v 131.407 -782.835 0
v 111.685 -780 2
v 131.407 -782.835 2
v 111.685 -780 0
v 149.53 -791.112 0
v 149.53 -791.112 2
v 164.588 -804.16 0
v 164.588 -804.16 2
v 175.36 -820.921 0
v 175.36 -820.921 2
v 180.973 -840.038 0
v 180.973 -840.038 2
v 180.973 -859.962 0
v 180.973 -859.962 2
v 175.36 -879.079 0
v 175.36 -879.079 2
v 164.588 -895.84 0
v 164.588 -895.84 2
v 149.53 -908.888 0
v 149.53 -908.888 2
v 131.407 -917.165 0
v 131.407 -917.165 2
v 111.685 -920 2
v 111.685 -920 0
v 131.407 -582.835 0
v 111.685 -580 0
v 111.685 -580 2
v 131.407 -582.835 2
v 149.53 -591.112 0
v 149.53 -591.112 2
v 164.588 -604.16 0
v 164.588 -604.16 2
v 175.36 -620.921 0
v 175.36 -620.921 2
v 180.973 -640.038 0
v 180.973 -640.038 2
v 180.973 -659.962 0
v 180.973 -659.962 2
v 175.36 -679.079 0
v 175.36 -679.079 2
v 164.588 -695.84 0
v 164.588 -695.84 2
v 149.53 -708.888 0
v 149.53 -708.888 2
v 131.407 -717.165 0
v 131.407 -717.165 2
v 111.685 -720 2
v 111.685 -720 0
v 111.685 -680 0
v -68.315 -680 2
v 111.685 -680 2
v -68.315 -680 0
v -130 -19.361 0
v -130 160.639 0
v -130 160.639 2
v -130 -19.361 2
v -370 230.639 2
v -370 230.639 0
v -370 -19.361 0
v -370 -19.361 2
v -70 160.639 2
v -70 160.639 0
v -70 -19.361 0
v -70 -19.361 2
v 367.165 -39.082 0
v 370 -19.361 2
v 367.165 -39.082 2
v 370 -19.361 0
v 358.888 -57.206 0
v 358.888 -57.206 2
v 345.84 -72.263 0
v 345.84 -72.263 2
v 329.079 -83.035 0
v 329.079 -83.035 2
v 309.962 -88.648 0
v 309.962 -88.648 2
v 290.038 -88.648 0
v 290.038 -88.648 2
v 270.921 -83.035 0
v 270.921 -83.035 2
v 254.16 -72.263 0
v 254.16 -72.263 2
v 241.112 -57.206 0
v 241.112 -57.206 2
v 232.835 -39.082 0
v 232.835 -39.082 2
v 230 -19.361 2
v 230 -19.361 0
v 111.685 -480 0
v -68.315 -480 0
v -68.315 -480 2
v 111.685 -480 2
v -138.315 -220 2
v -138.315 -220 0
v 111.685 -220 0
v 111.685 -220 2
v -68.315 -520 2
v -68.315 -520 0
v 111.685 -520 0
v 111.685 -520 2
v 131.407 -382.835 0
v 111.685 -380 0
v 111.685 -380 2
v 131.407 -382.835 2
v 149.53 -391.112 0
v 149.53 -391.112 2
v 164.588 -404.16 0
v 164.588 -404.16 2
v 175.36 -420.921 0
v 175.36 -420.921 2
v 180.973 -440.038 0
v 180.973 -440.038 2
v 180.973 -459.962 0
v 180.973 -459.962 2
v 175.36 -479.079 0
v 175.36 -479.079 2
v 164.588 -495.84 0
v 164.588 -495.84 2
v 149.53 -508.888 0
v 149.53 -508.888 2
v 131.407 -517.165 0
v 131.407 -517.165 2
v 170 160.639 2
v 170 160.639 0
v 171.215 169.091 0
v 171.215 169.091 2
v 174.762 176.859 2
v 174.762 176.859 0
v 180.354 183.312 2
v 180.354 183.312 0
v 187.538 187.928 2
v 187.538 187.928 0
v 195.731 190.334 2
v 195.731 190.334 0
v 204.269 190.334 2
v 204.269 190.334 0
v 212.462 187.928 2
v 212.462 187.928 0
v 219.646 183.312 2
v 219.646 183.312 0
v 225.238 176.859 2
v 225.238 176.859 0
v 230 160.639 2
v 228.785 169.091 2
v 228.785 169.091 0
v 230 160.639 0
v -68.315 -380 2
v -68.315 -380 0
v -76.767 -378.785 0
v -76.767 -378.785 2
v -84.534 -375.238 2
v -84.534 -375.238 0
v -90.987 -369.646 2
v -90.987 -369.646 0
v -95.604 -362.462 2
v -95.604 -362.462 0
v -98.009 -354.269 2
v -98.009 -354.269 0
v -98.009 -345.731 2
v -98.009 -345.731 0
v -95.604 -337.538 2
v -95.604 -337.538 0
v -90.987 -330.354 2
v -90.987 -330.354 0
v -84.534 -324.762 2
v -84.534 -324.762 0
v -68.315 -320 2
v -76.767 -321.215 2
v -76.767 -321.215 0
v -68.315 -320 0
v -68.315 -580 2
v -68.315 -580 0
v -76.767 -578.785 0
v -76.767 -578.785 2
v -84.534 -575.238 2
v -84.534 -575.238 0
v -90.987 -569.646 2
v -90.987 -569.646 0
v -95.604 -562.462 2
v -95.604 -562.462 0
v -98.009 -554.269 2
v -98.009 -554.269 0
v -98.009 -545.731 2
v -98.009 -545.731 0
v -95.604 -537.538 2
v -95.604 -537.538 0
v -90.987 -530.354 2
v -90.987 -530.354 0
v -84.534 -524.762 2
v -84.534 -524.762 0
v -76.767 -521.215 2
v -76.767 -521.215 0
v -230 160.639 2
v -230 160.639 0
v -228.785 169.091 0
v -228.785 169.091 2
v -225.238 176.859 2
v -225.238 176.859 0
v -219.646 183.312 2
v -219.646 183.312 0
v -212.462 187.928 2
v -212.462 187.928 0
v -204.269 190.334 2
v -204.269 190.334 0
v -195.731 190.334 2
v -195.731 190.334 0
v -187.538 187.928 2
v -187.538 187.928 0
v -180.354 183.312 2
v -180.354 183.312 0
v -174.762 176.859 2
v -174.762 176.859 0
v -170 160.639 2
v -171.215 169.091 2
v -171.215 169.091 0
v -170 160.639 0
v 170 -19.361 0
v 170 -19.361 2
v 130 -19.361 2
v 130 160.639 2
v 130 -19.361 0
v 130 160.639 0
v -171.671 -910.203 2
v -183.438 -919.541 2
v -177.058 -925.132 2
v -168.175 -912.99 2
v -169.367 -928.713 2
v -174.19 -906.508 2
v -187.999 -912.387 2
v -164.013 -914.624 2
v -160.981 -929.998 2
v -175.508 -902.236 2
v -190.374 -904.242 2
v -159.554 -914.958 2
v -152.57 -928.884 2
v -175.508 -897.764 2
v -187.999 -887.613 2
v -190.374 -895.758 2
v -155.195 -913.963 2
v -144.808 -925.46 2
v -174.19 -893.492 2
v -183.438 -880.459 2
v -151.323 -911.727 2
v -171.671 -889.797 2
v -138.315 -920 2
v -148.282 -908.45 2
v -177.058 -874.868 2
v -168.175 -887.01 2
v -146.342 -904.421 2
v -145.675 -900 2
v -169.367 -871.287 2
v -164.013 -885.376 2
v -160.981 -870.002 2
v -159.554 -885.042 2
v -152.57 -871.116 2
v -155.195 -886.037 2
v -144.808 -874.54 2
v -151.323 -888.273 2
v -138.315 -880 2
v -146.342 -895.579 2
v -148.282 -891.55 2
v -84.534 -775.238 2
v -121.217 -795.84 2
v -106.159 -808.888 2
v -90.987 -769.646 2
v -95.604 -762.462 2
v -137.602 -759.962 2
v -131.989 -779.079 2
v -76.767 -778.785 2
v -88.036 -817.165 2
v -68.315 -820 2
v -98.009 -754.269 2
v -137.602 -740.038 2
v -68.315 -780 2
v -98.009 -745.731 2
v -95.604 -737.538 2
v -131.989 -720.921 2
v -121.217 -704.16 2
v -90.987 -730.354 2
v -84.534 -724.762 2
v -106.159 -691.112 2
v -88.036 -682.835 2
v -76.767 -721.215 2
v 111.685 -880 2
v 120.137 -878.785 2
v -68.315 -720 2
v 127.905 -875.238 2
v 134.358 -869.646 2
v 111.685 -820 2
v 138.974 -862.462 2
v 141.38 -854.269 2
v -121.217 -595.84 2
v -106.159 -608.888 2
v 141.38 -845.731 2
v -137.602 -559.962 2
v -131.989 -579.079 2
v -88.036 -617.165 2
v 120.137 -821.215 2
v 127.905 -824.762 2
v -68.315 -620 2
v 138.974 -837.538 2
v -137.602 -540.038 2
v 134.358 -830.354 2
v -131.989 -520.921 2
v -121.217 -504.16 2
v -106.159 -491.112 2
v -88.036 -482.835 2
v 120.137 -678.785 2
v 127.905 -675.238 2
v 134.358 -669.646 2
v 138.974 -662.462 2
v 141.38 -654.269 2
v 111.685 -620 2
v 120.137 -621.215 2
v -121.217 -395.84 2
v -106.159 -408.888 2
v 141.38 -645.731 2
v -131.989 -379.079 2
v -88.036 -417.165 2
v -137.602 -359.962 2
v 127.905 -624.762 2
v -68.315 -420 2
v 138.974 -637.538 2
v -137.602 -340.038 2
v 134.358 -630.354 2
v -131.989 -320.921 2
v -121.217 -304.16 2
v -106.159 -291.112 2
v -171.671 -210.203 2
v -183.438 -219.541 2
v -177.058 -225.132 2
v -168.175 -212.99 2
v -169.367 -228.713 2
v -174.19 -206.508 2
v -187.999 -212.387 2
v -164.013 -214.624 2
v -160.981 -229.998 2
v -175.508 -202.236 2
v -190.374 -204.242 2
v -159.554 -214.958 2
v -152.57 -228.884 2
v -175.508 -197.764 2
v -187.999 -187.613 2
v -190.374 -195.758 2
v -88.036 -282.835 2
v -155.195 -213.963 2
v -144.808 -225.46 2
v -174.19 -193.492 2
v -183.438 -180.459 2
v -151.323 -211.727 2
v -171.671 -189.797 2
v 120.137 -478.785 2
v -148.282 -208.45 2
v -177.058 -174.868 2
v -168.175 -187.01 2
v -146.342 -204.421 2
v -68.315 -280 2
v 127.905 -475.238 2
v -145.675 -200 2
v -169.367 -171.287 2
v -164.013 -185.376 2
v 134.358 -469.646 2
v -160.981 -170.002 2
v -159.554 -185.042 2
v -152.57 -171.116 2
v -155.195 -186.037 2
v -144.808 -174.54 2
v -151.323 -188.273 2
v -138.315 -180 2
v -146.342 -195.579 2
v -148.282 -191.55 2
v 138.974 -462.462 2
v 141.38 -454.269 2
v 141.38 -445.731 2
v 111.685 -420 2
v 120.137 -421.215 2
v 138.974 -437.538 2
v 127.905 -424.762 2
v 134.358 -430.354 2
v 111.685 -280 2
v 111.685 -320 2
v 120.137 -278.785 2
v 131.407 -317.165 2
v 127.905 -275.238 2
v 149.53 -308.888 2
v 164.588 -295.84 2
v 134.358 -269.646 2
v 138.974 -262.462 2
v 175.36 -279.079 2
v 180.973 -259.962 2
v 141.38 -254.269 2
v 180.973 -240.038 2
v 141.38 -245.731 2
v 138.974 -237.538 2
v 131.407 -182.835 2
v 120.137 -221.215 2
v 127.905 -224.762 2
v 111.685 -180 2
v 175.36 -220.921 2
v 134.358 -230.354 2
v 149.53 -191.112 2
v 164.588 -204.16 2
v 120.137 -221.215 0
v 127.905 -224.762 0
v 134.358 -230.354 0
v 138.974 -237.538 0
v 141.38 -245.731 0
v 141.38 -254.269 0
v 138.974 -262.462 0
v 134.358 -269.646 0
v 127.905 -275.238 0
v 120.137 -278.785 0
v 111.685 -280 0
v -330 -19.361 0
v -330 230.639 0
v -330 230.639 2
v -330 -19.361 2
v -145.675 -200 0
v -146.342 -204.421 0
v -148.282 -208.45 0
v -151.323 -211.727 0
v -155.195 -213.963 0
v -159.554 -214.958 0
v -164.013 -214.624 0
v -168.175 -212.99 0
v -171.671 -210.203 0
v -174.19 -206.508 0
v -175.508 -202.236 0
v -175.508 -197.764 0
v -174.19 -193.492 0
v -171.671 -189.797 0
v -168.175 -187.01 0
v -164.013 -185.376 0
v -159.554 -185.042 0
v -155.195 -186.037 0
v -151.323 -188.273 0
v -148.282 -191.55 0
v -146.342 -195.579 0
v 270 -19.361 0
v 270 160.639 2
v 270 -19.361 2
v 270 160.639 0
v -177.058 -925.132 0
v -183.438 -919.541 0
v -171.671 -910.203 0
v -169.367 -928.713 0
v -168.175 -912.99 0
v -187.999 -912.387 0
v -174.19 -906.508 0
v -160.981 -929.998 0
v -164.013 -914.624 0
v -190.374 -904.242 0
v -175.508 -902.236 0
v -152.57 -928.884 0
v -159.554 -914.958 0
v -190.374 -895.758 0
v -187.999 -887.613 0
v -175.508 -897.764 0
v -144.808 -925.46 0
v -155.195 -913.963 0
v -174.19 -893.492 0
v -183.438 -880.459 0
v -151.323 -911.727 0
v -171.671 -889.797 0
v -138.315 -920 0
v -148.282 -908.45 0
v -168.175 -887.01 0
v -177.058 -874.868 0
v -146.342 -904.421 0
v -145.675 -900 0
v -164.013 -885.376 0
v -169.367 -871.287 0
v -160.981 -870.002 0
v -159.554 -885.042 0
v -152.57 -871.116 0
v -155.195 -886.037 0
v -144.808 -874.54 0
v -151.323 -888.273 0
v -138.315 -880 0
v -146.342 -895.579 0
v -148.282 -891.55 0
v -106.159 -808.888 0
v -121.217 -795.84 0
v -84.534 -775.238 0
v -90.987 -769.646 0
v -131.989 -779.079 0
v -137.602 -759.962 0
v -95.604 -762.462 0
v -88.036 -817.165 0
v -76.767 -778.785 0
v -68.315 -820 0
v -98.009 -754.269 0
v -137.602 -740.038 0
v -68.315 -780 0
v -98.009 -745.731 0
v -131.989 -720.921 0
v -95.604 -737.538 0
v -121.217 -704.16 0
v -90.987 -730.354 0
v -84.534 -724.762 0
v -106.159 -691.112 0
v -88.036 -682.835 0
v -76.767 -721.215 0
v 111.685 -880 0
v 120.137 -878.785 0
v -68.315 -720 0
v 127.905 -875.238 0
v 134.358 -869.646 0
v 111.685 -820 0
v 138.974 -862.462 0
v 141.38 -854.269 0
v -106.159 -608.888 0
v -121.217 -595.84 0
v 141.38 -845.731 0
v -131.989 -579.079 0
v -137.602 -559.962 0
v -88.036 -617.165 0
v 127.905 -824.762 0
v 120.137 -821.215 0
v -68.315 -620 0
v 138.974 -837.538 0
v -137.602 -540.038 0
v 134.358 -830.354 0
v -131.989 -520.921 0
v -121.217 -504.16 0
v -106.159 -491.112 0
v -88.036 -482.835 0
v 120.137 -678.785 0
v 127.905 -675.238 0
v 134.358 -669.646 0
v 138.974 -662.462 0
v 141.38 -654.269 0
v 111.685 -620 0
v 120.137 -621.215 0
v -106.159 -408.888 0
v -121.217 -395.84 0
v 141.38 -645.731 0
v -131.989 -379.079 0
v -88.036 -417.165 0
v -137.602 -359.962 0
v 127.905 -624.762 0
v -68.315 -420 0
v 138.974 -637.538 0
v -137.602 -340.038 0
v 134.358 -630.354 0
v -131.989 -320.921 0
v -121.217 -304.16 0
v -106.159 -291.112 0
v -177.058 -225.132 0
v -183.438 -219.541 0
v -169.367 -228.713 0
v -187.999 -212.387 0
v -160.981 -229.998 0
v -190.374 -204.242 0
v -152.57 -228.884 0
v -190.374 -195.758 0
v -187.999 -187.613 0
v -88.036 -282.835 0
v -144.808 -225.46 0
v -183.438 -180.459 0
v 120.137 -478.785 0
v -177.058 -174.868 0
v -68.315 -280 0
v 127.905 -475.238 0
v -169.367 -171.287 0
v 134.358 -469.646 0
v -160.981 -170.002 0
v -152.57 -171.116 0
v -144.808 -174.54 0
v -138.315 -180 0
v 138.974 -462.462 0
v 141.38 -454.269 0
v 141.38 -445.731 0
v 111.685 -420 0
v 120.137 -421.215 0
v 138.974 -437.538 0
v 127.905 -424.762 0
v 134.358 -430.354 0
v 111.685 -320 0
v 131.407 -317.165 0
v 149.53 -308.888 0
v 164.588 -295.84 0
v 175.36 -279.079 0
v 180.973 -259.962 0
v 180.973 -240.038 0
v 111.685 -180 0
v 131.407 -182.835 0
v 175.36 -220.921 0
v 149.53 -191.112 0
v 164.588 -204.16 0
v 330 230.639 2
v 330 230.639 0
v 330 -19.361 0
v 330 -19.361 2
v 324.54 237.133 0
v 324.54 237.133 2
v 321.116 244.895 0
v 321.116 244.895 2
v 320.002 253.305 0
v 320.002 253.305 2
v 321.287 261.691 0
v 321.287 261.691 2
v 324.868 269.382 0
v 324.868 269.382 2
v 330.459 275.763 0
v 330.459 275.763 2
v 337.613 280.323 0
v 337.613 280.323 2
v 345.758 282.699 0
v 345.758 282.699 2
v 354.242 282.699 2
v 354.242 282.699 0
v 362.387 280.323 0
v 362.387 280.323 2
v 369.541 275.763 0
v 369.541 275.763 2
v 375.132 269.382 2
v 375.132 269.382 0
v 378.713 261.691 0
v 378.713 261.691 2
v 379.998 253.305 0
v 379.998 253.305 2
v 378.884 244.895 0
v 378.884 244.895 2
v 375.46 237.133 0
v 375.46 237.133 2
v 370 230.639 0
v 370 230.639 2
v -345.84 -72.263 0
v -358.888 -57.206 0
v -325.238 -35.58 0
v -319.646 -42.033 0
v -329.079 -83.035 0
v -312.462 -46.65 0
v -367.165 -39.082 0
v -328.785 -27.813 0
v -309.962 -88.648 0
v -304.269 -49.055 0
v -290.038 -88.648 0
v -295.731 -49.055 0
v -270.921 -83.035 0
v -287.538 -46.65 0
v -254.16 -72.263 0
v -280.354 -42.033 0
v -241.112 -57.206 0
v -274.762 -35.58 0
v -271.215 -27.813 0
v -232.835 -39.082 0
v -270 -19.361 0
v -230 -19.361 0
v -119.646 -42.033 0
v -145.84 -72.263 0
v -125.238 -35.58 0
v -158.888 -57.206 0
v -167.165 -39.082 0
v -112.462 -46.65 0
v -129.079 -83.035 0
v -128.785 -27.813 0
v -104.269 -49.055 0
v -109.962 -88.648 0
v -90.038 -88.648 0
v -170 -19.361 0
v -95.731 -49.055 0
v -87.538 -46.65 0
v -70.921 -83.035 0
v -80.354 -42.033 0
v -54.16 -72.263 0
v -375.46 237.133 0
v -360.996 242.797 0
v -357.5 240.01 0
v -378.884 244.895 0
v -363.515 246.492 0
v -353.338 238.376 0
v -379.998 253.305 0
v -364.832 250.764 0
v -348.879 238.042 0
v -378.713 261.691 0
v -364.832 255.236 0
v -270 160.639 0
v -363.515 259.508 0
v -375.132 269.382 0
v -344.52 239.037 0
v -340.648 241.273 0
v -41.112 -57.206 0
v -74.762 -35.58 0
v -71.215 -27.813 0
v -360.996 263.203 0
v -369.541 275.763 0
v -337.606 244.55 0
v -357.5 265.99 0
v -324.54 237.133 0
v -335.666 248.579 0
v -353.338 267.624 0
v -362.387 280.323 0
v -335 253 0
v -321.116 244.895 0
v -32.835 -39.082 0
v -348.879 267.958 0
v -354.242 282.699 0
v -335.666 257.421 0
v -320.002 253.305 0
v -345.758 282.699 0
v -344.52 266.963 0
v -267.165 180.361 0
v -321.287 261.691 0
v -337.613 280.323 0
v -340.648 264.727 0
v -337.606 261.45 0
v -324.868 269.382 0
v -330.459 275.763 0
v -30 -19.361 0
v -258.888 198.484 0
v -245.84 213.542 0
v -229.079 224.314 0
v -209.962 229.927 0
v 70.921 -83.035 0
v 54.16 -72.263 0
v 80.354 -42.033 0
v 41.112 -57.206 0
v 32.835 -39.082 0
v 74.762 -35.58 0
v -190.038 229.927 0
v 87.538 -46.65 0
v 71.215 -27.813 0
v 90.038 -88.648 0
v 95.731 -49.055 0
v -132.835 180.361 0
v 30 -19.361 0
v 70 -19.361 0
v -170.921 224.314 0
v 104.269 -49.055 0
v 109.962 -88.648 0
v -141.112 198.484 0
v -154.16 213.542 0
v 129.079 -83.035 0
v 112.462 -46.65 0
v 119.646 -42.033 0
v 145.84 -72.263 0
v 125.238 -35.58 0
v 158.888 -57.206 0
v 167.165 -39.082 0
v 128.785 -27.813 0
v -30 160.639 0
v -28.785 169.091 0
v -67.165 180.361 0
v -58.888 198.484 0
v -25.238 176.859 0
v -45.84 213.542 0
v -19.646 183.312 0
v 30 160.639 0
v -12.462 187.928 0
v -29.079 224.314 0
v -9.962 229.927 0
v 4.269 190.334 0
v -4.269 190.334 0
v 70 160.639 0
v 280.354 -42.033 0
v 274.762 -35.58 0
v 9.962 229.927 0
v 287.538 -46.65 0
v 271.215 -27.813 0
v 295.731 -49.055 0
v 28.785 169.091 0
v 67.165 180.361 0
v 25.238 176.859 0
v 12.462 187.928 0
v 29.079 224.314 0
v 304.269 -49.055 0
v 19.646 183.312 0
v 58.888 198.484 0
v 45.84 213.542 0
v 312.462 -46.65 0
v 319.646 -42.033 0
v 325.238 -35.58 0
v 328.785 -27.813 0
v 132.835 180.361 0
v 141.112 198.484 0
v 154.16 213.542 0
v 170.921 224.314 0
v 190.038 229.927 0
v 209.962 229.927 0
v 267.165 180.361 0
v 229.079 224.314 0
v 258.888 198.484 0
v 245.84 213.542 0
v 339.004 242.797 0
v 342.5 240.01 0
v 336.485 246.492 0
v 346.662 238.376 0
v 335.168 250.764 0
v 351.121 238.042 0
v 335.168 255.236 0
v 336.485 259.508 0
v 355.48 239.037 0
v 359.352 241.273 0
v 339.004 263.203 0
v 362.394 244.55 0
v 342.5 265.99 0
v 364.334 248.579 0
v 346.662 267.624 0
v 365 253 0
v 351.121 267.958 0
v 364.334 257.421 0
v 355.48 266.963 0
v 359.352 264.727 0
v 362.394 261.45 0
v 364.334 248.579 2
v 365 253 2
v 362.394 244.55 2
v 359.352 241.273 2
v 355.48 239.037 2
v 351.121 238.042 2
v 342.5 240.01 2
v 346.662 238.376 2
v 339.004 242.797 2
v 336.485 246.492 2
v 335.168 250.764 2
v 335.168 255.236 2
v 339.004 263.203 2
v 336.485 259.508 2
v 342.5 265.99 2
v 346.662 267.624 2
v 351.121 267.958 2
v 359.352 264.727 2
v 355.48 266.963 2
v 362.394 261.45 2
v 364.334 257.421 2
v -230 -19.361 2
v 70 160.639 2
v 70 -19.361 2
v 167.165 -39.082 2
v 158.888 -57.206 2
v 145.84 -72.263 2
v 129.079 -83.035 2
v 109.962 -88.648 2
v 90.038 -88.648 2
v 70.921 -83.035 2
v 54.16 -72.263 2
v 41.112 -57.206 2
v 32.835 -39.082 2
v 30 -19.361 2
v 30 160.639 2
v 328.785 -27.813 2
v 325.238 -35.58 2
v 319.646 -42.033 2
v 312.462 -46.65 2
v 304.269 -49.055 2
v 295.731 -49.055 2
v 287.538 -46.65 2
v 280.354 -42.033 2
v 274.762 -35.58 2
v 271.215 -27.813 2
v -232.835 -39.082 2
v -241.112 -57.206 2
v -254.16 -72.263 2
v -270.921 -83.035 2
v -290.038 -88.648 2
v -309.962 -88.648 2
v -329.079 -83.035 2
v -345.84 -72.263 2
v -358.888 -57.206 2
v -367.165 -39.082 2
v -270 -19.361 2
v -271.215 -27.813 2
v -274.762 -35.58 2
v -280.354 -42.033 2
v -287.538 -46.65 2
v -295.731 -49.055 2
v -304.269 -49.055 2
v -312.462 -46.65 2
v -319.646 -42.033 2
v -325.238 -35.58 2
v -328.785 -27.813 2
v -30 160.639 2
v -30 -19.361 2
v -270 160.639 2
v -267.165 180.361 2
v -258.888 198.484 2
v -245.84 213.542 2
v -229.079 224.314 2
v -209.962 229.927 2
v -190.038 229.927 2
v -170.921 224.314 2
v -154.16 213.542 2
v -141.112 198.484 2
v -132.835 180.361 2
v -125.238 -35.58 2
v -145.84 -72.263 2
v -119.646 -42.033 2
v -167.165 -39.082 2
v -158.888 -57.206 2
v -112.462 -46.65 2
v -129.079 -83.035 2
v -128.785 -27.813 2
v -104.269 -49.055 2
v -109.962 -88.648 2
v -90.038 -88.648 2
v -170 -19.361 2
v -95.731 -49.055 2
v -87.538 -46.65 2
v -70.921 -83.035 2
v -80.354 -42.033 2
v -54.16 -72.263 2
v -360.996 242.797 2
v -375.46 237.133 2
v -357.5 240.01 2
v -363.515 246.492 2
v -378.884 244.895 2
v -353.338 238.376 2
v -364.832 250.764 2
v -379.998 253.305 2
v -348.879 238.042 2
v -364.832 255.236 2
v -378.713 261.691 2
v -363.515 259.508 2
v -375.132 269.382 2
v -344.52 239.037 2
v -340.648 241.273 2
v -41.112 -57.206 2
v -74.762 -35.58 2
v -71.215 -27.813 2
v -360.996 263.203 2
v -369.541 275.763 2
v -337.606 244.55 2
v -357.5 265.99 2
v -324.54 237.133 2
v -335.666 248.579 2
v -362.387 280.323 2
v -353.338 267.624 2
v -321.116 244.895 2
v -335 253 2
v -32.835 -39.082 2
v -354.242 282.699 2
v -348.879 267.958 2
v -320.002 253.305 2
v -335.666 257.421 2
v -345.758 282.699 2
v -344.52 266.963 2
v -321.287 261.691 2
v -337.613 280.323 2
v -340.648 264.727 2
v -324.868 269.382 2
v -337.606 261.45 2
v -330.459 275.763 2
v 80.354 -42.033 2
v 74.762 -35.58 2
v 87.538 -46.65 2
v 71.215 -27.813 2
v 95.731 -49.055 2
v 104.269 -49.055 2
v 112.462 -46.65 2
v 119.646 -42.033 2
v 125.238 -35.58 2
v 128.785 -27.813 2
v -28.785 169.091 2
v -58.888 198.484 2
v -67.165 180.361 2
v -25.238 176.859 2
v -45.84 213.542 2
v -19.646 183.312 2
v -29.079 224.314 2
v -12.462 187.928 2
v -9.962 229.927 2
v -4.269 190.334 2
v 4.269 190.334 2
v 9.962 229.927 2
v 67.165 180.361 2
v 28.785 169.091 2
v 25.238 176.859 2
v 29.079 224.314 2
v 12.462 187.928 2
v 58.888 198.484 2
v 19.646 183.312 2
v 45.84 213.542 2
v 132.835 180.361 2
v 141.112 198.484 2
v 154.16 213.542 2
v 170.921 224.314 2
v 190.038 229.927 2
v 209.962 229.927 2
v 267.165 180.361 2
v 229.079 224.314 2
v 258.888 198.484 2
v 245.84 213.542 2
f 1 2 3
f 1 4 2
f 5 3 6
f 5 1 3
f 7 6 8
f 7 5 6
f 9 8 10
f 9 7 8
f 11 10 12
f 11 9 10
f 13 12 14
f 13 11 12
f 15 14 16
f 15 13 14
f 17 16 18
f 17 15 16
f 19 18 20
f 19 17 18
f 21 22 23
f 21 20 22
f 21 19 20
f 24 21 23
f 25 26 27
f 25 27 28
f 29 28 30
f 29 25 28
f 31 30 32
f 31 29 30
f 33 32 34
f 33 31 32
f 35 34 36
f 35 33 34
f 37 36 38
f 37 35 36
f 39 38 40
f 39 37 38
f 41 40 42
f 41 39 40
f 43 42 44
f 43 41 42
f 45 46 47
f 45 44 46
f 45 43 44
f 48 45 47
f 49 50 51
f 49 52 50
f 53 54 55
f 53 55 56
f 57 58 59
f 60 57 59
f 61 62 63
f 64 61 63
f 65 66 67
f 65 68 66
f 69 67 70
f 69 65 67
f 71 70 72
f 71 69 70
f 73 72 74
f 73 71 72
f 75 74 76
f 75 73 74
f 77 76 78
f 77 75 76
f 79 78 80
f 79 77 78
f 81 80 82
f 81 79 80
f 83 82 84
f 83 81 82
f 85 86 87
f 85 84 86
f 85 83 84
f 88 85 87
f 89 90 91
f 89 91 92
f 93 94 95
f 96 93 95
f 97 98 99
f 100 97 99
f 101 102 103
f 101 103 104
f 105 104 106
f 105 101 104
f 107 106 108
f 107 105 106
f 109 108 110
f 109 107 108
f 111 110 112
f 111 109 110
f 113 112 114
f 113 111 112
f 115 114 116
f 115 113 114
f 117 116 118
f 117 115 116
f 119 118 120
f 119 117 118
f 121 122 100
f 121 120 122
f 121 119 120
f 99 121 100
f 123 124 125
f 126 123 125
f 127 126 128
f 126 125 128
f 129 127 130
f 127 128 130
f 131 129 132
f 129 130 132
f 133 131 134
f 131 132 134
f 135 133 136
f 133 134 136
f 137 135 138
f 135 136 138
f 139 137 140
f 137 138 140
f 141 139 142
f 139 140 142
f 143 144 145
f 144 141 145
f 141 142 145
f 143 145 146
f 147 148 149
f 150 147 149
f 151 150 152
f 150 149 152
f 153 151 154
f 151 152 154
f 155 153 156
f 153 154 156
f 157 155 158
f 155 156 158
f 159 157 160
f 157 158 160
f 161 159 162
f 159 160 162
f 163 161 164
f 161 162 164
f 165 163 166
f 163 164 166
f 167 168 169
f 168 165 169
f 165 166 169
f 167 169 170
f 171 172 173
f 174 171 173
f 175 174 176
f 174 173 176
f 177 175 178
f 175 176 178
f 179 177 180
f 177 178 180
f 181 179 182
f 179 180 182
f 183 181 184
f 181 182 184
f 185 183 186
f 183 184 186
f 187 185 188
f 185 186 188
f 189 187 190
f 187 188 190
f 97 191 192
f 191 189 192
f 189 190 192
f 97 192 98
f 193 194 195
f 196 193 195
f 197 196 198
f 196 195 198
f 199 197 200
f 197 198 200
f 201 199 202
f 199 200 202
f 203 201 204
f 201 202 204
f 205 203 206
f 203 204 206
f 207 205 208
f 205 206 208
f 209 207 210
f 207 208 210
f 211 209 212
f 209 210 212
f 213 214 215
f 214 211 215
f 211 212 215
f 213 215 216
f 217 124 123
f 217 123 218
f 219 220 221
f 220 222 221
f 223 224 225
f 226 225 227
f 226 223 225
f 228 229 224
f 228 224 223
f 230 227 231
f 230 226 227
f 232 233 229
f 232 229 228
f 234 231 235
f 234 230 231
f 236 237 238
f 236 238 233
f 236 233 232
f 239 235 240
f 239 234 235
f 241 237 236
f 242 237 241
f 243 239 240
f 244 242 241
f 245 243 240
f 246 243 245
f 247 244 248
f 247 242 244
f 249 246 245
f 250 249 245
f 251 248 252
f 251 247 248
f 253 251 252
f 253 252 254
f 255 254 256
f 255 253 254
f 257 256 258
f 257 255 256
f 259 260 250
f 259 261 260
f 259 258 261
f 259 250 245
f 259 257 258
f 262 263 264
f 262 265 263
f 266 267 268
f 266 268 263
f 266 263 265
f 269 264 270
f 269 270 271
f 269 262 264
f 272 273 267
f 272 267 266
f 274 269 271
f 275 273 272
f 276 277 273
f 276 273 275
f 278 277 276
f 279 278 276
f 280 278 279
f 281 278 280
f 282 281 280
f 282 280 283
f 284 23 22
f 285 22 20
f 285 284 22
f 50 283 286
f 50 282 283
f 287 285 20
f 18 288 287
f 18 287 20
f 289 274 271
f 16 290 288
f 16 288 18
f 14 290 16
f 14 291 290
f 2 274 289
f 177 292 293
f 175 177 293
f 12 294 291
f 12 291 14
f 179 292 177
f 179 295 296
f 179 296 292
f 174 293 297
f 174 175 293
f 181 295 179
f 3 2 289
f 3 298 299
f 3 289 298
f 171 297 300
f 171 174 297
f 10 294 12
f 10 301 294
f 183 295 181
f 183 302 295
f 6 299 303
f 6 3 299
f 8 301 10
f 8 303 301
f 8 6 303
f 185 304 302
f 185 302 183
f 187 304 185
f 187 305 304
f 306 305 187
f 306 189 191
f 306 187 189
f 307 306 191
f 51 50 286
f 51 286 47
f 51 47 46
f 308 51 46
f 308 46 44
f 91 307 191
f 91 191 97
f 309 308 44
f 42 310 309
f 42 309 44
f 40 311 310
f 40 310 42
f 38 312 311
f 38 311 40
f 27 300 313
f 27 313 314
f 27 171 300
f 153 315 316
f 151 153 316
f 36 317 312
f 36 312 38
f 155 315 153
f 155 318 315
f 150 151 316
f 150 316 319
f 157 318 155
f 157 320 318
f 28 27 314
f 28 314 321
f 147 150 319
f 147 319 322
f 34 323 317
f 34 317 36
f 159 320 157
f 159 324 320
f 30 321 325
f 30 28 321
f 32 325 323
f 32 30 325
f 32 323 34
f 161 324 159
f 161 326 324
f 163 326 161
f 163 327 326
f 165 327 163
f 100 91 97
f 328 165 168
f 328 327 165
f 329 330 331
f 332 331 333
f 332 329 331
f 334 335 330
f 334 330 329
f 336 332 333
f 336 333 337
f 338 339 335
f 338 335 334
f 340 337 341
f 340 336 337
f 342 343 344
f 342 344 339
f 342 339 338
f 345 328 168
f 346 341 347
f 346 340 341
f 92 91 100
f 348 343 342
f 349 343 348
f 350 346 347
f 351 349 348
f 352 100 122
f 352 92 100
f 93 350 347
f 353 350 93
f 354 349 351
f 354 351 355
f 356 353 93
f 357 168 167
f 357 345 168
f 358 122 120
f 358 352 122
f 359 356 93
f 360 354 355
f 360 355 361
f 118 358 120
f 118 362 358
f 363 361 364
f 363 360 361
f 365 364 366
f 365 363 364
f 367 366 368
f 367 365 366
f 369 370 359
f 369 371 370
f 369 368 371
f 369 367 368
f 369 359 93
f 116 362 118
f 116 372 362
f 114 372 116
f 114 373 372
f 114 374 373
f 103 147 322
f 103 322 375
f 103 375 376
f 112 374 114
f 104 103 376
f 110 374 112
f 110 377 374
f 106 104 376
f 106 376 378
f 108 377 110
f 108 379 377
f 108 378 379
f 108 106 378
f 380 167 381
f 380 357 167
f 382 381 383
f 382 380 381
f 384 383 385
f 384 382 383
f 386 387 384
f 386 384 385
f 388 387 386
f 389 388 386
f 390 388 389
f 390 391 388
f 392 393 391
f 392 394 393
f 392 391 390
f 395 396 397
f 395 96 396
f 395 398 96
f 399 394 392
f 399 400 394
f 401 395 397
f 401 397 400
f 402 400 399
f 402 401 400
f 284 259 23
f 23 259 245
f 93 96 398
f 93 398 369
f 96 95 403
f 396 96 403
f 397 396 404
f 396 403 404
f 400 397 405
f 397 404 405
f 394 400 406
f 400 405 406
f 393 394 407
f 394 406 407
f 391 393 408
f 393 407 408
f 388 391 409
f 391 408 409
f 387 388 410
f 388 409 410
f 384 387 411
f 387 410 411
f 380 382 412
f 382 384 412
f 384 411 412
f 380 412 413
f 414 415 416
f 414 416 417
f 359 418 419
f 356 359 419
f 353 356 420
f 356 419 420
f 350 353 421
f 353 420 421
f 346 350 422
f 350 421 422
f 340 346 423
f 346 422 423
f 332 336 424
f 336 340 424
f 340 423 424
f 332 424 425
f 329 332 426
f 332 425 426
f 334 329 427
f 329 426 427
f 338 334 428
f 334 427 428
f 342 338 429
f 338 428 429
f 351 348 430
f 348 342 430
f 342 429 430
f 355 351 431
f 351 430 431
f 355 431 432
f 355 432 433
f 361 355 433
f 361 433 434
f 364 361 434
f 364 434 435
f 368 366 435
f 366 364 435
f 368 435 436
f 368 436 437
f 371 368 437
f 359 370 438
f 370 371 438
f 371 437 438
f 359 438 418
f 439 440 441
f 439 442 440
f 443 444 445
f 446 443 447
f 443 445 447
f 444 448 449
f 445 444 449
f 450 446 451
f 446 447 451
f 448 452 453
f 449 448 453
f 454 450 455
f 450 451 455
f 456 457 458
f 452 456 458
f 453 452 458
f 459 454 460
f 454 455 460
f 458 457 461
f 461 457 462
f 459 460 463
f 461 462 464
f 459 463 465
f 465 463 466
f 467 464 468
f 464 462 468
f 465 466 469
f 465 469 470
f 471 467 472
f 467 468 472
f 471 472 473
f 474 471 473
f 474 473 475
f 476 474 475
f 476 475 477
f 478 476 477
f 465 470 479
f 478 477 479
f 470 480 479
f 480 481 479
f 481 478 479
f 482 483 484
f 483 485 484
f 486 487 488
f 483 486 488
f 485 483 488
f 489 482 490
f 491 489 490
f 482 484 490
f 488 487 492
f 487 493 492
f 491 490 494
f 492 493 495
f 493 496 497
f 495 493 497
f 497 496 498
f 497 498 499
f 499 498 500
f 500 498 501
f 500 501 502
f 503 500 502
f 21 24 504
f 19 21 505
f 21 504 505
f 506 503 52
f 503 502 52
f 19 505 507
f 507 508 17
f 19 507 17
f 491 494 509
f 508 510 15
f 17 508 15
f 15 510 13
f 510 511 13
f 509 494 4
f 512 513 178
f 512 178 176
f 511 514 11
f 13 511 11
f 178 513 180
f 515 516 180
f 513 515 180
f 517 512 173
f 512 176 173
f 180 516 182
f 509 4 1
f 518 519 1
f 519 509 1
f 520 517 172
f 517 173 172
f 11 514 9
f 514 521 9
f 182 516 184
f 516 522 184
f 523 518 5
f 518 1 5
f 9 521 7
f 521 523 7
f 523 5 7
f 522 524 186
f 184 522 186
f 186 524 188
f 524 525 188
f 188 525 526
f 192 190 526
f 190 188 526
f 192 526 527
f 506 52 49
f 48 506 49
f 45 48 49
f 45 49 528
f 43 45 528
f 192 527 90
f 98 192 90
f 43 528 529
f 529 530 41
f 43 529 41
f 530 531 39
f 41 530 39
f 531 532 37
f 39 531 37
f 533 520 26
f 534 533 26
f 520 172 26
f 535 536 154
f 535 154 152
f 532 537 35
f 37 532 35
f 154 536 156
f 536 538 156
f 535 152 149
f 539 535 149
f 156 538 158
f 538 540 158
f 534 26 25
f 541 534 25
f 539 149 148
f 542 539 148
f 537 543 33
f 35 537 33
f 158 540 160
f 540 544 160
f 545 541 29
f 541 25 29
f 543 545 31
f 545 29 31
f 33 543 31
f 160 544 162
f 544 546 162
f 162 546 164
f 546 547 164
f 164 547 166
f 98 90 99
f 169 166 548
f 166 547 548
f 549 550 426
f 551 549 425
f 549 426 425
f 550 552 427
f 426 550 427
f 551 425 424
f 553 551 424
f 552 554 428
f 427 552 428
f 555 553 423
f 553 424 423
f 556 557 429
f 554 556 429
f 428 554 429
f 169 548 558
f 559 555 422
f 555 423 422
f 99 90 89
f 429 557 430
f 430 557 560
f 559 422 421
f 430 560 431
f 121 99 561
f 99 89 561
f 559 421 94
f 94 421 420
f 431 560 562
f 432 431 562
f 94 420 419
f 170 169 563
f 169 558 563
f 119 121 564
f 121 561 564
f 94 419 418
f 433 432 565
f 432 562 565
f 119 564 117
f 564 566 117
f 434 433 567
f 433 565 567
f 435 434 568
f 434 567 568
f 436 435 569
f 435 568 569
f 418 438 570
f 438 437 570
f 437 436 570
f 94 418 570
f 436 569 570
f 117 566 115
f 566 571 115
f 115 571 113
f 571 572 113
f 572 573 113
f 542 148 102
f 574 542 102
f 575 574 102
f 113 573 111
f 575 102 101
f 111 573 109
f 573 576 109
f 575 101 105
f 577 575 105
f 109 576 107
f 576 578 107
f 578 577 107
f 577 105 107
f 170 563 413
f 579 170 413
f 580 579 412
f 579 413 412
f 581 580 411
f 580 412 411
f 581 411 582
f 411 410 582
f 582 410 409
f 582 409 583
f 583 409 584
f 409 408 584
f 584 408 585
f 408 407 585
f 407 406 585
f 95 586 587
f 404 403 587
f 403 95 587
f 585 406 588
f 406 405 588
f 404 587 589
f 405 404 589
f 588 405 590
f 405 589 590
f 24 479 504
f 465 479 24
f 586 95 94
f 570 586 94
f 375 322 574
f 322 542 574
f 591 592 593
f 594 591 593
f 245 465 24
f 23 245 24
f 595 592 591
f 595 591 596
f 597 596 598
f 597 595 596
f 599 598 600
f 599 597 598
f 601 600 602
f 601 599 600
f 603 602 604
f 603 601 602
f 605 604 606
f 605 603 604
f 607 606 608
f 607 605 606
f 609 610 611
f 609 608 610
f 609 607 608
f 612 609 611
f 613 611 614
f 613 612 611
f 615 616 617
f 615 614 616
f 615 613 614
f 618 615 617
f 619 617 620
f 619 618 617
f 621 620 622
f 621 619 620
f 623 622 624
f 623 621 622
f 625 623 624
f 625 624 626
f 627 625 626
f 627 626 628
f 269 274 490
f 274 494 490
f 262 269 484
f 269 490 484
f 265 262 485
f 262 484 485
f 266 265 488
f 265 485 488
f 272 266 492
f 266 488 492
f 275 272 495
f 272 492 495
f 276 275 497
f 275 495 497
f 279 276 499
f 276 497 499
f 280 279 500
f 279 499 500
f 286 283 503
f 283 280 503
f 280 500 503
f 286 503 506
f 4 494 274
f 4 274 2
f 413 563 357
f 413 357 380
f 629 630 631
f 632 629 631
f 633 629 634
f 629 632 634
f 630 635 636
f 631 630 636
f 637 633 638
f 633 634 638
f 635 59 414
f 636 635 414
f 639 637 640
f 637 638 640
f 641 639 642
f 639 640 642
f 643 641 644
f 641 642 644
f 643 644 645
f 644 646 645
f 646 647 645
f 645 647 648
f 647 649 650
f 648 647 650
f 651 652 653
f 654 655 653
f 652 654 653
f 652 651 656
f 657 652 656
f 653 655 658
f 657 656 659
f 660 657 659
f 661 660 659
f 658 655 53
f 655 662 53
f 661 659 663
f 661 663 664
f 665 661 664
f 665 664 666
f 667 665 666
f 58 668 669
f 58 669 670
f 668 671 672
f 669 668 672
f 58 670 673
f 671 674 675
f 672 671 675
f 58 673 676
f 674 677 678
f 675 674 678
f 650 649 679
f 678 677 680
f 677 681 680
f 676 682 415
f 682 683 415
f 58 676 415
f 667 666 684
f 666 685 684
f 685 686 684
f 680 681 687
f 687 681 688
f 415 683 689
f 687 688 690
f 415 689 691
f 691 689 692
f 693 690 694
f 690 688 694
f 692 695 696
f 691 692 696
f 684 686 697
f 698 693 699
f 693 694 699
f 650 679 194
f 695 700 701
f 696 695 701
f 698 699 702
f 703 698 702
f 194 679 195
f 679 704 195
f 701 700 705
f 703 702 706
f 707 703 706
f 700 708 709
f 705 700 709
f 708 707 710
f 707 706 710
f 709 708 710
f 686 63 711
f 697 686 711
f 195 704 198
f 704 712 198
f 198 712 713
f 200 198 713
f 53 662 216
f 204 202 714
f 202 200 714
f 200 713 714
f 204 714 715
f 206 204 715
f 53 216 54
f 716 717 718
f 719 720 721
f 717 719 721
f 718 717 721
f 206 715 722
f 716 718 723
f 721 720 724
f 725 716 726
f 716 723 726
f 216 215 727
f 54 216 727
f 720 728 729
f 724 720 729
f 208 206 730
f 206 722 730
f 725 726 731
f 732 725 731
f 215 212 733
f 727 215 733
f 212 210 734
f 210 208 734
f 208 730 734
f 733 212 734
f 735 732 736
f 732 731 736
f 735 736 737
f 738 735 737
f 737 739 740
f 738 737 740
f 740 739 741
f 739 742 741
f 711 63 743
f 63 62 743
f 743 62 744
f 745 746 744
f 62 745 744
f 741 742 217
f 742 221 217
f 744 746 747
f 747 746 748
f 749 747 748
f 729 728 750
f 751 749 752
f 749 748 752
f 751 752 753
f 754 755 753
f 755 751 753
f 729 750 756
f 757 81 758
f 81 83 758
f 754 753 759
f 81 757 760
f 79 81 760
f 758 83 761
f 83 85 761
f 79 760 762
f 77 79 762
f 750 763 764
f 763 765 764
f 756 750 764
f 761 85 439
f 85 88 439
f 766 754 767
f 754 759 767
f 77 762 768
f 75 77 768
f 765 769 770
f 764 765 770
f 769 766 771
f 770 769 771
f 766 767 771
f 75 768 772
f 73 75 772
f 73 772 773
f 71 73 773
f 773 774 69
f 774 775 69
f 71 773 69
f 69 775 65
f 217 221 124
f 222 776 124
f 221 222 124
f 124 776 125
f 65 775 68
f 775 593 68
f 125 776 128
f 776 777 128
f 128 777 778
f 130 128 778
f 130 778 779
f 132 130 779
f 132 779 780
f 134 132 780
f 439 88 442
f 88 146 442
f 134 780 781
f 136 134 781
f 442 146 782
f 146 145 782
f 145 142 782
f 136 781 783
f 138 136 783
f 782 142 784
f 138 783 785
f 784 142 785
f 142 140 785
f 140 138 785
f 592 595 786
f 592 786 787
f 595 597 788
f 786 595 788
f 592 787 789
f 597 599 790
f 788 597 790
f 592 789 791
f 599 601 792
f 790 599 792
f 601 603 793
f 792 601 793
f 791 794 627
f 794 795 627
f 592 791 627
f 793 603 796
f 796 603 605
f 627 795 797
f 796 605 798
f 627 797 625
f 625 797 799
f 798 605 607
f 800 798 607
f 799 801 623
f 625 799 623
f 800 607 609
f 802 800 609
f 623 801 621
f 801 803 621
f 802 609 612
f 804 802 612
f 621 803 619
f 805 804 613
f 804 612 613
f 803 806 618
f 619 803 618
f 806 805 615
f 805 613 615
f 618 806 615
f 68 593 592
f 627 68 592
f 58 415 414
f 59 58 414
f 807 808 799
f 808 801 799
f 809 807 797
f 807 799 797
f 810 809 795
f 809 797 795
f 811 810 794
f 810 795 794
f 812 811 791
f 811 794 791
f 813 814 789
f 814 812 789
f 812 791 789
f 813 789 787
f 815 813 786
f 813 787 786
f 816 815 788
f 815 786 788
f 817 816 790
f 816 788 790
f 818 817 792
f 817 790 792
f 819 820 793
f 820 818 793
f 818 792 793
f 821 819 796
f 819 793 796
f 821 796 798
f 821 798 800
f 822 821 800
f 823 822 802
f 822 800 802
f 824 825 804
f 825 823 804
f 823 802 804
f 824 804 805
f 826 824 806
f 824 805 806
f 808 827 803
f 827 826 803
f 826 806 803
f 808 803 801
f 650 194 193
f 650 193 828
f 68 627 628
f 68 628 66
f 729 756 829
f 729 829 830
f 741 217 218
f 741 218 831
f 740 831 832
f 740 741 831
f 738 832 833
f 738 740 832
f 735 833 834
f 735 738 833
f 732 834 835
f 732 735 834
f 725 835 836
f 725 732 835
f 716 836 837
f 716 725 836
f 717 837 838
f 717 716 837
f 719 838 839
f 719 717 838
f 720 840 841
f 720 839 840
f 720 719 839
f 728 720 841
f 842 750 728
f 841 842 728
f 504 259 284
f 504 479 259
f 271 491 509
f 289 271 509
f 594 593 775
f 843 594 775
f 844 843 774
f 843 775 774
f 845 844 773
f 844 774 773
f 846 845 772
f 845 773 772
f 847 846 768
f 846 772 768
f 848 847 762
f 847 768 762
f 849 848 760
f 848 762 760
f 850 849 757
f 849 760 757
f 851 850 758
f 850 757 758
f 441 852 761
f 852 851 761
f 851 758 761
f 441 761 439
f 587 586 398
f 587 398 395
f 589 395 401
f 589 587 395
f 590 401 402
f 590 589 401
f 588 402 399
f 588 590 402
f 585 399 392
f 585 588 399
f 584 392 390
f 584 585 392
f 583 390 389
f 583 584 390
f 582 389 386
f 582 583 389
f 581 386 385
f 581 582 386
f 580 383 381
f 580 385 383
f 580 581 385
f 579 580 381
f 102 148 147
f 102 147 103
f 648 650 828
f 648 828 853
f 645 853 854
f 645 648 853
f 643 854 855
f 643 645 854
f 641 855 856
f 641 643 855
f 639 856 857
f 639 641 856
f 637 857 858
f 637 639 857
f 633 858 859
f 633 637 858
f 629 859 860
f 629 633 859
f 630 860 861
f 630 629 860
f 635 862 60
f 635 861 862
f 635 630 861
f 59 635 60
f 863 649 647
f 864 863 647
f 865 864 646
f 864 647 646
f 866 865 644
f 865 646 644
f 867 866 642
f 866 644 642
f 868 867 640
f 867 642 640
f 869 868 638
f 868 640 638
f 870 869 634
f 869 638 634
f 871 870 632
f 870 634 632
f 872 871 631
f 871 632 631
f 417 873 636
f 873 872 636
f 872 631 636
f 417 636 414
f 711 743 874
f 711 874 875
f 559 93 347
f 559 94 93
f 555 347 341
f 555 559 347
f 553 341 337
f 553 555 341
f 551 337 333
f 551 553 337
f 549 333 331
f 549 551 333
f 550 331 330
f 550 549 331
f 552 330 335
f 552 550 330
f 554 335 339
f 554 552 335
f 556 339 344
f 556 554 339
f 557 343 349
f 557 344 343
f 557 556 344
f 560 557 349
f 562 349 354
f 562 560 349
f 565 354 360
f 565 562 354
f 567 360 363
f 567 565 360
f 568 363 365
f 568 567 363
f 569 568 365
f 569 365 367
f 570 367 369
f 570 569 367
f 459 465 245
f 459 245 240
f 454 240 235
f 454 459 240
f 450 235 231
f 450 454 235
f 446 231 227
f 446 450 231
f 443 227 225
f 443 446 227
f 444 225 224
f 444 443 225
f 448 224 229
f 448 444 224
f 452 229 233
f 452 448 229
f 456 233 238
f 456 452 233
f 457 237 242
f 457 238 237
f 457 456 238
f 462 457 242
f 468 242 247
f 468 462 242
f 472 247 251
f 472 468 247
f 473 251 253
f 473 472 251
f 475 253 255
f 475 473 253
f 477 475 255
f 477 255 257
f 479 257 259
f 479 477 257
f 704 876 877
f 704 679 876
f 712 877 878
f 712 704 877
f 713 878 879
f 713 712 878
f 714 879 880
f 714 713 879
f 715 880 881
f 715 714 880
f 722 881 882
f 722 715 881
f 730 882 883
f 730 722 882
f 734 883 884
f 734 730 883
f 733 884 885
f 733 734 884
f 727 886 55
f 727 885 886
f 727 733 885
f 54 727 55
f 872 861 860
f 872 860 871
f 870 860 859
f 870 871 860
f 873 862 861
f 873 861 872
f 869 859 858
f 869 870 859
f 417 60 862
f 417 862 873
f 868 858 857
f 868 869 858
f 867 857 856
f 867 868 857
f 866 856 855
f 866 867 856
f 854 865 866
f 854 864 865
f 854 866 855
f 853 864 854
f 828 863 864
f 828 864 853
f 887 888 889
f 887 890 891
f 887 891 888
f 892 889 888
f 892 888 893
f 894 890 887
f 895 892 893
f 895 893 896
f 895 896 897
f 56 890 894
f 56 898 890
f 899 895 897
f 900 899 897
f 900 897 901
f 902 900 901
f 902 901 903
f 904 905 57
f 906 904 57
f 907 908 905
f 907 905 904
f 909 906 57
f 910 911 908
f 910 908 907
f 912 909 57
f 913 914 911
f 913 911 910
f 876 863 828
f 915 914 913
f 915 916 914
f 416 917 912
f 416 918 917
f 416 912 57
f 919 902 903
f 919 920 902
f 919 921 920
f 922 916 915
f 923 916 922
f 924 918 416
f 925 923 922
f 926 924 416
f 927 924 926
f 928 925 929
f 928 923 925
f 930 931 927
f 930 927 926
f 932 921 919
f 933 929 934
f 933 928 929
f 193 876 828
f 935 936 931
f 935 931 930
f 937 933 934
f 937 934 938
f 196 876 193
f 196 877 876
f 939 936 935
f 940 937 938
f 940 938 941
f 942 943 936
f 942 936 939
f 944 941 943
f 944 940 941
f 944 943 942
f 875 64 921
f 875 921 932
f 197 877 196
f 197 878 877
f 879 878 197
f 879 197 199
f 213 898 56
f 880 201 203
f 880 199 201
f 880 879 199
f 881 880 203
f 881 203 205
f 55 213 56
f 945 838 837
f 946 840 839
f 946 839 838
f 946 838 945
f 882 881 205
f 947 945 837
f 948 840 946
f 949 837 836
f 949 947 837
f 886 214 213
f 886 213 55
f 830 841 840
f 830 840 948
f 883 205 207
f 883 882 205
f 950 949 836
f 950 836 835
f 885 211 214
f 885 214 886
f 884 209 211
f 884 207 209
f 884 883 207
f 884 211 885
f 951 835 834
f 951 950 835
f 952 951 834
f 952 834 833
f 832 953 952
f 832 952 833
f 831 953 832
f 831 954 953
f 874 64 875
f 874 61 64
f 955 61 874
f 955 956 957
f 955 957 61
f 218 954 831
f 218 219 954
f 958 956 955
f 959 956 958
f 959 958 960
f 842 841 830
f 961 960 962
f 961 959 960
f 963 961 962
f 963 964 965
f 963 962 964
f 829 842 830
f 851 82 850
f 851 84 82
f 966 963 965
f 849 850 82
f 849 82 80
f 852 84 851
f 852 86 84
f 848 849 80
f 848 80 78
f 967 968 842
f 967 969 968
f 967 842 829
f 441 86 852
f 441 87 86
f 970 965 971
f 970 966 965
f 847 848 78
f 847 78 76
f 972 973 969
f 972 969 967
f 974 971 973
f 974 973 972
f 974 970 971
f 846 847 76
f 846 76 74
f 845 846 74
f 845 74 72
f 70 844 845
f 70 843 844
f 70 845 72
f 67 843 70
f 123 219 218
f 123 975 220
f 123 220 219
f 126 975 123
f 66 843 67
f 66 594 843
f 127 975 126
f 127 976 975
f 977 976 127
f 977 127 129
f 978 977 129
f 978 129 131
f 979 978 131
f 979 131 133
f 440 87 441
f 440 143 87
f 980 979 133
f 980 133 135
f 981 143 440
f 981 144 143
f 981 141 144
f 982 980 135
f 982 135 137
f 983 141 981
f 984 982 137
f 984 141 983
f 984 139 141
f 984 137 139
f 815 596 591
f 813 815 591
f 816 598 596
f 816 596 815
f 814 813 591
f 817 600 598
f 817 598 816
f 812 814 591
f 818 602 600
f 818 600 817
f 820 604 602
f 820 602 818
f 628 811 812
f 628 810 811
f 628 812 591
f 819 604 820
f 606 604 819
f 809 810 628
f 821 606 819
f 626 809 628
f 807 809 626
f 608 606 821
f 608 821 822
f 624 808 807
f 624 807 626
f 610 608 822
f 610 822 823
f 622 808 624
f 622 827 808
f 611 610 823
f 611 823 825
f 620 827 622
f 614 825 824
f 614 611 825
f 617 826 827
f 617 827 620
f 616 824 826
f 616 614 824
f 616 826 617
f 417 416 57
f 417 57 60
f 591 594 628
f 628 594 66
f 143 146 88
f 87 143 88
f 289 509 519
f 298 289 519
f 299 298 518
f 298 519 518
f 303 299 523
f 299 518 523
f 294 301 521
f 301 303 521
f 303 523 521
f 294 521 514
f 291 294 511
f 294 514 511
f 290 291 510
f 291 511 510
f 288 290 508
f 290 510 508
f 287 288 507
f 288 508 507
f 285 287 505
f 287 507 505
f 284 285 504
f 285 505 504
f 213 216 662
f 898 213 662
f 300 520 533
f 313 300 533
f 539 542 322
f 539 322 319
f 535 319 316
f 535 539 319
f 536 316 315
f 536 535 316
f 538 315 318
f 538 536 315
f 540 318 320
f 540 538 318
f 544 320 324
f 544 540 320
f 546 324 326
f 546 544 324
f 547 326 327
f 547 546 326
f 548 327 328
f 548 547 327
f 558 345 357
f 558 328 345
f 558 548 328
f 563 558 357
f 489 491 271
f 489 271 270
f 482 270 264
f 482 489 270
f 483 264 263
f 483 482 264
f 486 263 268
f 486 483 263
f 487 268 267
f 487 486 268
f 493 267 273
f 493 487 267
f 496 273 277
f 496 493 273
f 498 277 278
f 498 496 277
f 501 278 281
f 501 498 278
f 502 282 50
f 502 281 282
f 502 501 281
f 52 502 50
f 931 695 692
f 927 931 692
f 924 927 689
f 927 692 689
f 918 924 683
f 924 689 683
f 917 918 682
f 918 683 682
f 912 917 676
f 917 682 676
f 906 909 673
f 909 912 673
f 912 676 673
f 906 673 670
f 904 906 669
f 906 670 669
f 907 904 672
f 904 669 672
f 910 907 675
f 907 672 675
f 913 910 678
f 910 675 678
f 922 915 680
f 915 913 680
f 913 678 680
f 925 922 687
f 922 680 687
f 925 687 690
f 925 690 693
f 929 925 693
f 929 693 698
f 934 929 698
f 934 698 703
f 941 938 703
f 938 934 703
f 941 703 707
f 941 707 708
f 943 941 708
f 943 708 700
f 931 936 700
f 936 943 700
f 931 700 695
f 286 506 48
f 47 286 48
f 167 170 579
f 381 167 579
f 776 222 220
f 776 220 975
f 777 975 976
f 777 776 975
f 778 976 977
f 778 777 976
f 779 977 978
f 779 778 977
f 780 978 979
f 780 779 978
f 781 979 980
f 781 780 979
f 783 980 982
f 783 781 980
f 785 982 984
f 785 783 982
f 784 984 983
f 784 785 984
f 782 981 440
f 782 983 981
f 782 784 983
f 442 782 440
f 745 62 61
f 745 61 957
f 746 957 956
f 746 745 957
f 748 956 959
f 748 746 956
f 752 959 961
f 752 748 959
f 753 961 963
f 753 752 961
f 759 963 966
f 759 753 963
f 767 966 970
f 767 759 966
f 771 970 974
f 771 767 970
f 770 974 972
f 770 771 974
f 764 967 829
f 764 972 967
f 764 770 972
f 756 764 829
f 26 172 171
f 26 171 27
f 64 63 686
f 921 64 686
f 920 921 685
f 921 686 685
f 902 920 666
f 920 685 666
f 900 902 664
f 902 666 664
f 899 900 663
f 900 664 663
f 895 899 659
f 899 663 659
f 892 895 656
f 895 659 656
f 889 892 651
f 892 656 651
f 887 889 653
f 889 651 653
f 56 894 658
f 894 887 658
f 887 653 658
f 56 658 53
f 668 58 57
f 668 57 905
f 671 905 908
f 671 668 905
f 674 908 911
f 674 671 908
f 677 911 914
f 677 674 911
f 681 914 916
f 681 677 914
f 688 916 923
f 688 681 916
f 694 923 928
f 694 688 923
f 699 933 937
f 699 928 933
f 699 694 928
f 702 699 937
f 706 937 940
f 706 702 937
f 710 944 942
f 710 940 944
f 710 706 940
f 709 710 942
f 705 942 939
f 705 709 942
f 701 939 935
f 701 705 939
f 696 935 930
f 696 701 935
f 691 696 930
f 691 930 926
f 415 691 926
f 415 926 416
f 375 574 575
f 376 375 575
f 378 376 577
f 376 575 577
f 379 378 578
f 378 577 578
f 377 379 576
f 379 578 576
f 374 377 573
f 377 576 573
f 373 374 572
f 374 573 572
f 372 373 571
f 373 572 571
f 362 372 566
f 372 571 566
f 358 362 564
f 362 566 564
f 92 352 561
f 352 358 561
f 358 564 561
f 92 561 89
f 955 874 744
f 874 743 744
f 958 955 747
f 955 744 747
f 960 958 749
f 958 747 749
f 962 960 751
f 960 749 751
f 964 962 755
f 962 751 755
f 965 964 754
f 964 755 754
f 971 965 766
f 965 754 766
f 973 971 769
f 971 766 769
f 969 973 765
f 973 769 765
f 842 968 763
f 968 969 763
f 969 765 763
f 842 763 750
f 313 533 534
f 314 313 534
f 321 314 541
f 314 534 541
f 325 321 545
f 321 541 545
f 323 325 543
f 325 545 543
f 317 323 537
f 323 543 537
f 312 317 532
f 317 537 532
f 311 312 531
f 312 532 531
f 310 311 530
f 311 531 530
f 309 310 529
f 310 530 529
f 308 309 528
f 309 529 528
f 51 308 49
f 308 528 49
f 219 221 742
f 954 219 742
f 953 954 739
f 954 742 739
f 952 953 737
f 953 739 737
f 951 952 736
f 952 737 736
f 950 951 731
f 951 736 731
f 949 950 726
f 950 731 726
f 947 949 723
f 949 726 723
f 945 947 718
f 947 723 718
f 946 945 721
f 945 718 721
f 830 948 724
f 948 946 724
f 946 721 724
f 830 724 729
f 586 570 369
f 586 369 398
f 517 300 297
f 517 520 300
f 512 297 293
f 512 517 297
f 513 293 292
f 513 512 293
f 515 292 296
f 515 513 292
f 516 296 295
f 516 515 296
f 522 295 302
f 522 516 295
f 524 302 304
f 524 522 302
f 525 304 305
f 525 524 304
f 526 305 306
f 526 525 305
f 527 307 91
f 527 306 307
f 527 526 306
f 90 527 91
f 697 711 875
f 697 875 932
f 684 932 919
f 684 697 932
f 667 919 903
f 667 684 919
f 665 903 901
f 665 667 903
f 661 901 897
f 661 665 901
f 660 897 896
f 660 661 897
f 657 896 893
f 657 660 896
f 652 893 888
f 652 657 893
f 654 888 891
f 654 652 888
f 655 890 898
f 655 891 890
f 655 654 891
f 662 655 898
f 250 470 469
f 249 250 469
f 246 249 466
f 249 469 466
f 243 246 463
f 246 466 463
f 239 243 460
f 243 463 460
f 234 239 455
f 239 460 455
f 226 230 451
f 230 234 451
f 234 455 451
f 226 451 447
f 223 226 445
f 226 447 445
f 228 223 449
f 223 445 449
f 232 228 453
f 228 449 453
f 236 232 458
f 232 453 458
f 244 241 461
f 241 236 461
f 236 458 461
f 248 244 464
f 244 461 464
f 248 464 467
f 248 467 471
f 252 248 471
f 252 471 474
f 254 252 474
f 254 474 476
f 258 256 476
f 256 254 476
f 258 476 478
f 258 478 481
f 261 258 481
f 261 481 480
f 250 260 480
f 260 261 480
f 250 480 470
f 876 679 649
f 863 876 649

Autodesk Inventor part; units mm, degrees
ref_plane "YZ Plane" through (0, 0, 0) normal (1, 0, 0) x (0, 1, 0)
ref_plane "XZ Plane" through (0, 0, 0) normal (0, 1, 0) x (-1, 0, 0)
ref_plane "XY Plane" through (0, 0, 0) normal (0, 0, 1) x (1, 0, 0)
sketch "Esboço1" plane through (0, 0, 0) normal (0, 0, 1) x (1, 0, 0)
  circle A0 centre (-350, 253) radius 30 construction
  line L0 (0, 0) -> (0, 0) construction
  line L1 (0, 0) -> (0, 0) construction
  circle A1 centre (-350, 253) radius 15
  line L2 (-370, 230.6393) -> (-370, -19.3607)
  line L3 (-330, 230.6393) -> (-330, -19.3607)
  arc A2 (-330, 230.6393) -> (-370, 230.6393) centre (-350, 253) ccw
  circle A3 centre (-300, -19.3607) radius 30 construction
  line L4 (-270, 160.6393) -> (-270, -19.3607)
  line L5 (-230, 160.6393) -> (-230, -19.3607)
  circle A4 centre (-300, -19.3607) radius 70 construction
  arc A5 (-370, -19.3607) -> (-230, -19.3607) centre (-300, -19.3607) ccw
  arc A6 (-330, -19.3607) -> (-270, -19.3607) centre (-300, -19.3607) ccw
  line L6 (-330, 230.6393) -> (0, 230.6393) construction
  circle A7 centre (-200, 160.6393) radius 30 construction
  circle A8 centre (-200, 160.6393) radius 70 construction
  line L7 (-170, 160.6393) -> (-170, -19.3607)
  line L8 (-130, 160.6393) -> (-130, -19.3607)
  arc A9 (-170, 160.6393) -> (-230, 160.6393) centre (-200, 160.6393) ccw
  arc A10 (-130, 160.6393) -> (-270, 160.6393) centre (-200, 160.6393) ccw
  circle A11 centre (-100, -19.3607) radius 30 construction
  circle A12 centre (-100, -19.3607) radius 70 construction
  arc A13 (-130, -19.3607) -> (-70, -19.3607) centre (-100, -19.3607) ccw
  arc A14 (-170, -19.3607) -> (-30, -19.3607) centre (-100, -19.3607) ccw
  line L9 (-70, 160.6393) -> (-70, -19.3607)
  line L10 (-30, 160.6393) -> (-30, -19.3607)
  circle A15 centre (0, 160.6393) radius 30 construction
  circle A16 centre (0, 160.6393) radius 70 construction
  arc A17 (30, 160.6393) -> (-30, 160.6393) centre (0, 160.6393) ccw
  arc A18 (70, 160.6393) -> (-70, 160.6393) centre (0, 160.6393) ccw
  line L11 (70, 160.6393) -> (70, -19.3607)
  line L12 (30, 160.6393) -> (30, -19.3607)
  circle A19 centre (100, -19.3607) radius 30 construction
  circle A20 centre (100, -19.3607) radius 70 construction
  arc A21 (70, -19.3607) -> (130, -19.3607) centre (100, -19.3607) ccw
  arc A22 (30, -19.3607) -> (170, -19.3607) centre (100, -19.3607) ccw
  line L13 (130, 160.6393) -> (130, -19.3607)
  line L14 (170, 160.6393) -> (170, -19.3607)
  circle A23 centre (200, 160.6393) radius 30 construction
  circle A24 centre (200, 160.6393) radius 70 construction
  arc A25 (230, 160.6393) -> (170, 160.6393) centre (200, 160.6393) ccw
  arc A26 (270, 160.6393) -> (130, 160.6393) centre (200, 160.6393) ccw
  line L15 (230, 160.6393) -> (230, -19.3607)
  line L16 (270, 160.6393) -> (270, -19.3607)
  circle A27 centre (300, -19.3607) radius 30 construction
  circle A28 centre (300, -19.3607) radius 70 construction
  arc A29 (270, -19.3607) -> (330, -19.3607) centre (300, -19.3607) ccw
  arc A30 (230, -19.3607) -> (370, -19.3607) centre (300, -19.3607) ccw
  line L17 (330, 230.6393) -> (330, -19.3607)
  line L18 (370, 230.6393) -> (370, -19.3607)
  circle A31 centre (350, 253) radius 30 construction
  arc A32 (370, 230.6393) -> (330, 230.6393) centre (350, 253) ccw
  circle A33 centre (350, 253) radius 15
  line L19 (-350, 253) -> (350, 253) construction
  circle A34 centre (-160.6752, -200) radius 30 construction
  line L20 (0, 0) -> (-350, 0)
  circle A35 centre (-160.6752, -200) radius 15
  line L21 (-138.3146, -180) -> (111.6854, -180)
  line L22 (-138.3146, -220) -> (111.6854, -220)
  arc A36 (-138.3146, -180) -> (-138.3146, -220) centre (-160.6752, -200) ccw
  circle A37 centre (111.6854, -250) radius 30 construction
  circle A38 centre (111.6854, -250) radius 70 construction
  arc A39 (111.6854, -280) -> (111.6854, -220) centre (111.6854, -250) ccw
  arc A40 (111.6854, -320) -> (111.6854, -180) centre (111.6854, -250) ccw
  line L23 (-68.3146, -280) -> (111.6854, -280)
  line L24 (-68.3146, -320) -> (111.6854, -320)
  circle A41 centre (-68.3146, -350) radius 30 construction
  arc A42 (-68.3146, -320) -> (-68.3146, -380) centre (-68.3146, -350) ccw
  circle A43 centre (-68.3146, -350) radius 70 construction
  arc A44 (-68.3146, -280) -> (-68.3146, -420) centre (-68.3146, -350) ccw
  line L25 (-68.3146, -380) -> (111.6854, -380)
  line L26 (-68.3146, -420) -> (111.6854, -420)
  circle A45 centre (111.6854, -450) radius 30 construction
  circle A46 centre (111.6854, -450) radius 70 construction
  arc A47 (111.6854, -480) -> (111.6854, -420) centre (111.6854, -450) ccw
  arc A48 (111.6854, -520) -> (111.6854, -380) centre (111.6854, -450) ccw
  line L27 (-68.3146, -480) -> (111.6854, -480)
  line L28 (-68.3146, -520) -> (111.6854, -520)
  circle A49 centre (-68.3146, -550) radius 30 construction
  circle A50 centre (-68.3146, -550) radius 70 construction
  arc A51 (-68.3146, -520) -> (-68.3146, -580) centre (-68.3146, -550) ccw
  arc A52 (-68.3146, -480) -> (-68.3146, -620) centre (-68.3146, -550) ccw
  line L29 (-68.3146, -580) -> (111.6854, -580)
  line L30 (-68.3146, -620) -> (111.6854, -620)
  circle A53 centre (111.6854, -650) radius 30 construction
  circle A54 centre (111.6854, -650) radius 70 construction
  arc A55 (111.6854, -680) -> (108.1175, -620.2129) centre (111.6854, -650) ccw
  arc A56 (111.6854, -720) -> (111.6854, -580) centre (111.6854, -650) ccw
  line L31 (-68.3146, -720) -> (111.6854, -720)
  line L32 (-68.3146, -680) -> (111.6854, -680)
  circle A57 centre (-68.3146, -750) radius 30 construction
  circle A58 centre (-68.3146, -750) radius 70 construction
  arc A59 (-68.3146, -720) -> (-68.3146, -780) centre (-68.3146, -750) ccw
  arc A60 (-68.3146, -680) -> (-68.3146, -820) centre (-68.3146, -750) ccw
  line L33 (-68.3146, -780) -> (111.6854, -780)
  line L34 (-68.3146, -820) -> (111.6854, -820)
  circle A61 centre (111.6854, -850) radius 30 construction
  circle A62 centre (111.6854, -850) radius 70 construction
  arc A63 (111.6854, -880) -> (105.8073, -820.5815) centre (111.6854, -850) ccw
  arc A64 (111.6854, -920) -> (111.6854, -780) centre (111.6854, -850) ccw
  line L35 (-138.3146, -880) -> (111.6854, -880)
  line L36 (-138.3146, -920) -> (111.6854, -920)
  circle A65 centre (-160.6752, -900) radius 30 construction
  arc A66 (-138.3146, -880) -> (-138.3146, -920) centre (-160.6752, -900) ccw
  circle A67 centre (-160.6752, -900) radius 15
  line L37 (-160.6752, -200) -> (160.6752, -200) construction
  point P0 (-370, 105.6393)
  point P1 (0, 253)
  point P2 (-13.3146, -220)
  point P3 (-13.3146, -180)
  point P4 (0, -200)
  point P5 (-130, -19.3607)
  dimension "d0" = 253
  dimension "d2" = 60
  dimension "d3" = 30
  dimension "d5" = 40
  dimension "d6" = 250
  dimension "d7" = 60
  dimension "d8" = 40
  dimension "d13" = 40
  dimension "d14" = 200
extrude "Extrusão1" add sketch "Esboço1" along normal blind 2 contours A2 L3 A6 L4 L20 L5 A5 L2 | L20 L4 A10 L8 L7 A9 L5 | L20 L8 A13 L9 L10 A14 L7 | L9 A18 L11 A21 L13 A26 L16 A29 L17 A32 L18 A30 L15 A25 L14 A22 L12 A17 L10 L20 | L21 A40 L24 A42 L25 A48 L28 A51 L29 A56 L31 A59 L33 A64 L36 A66 L35 A63 L34 A60 L32 A55 L30 A52 L27 A47 L26 A44 L23 A39 L22 A36
properties part number "sensor_002_001"
